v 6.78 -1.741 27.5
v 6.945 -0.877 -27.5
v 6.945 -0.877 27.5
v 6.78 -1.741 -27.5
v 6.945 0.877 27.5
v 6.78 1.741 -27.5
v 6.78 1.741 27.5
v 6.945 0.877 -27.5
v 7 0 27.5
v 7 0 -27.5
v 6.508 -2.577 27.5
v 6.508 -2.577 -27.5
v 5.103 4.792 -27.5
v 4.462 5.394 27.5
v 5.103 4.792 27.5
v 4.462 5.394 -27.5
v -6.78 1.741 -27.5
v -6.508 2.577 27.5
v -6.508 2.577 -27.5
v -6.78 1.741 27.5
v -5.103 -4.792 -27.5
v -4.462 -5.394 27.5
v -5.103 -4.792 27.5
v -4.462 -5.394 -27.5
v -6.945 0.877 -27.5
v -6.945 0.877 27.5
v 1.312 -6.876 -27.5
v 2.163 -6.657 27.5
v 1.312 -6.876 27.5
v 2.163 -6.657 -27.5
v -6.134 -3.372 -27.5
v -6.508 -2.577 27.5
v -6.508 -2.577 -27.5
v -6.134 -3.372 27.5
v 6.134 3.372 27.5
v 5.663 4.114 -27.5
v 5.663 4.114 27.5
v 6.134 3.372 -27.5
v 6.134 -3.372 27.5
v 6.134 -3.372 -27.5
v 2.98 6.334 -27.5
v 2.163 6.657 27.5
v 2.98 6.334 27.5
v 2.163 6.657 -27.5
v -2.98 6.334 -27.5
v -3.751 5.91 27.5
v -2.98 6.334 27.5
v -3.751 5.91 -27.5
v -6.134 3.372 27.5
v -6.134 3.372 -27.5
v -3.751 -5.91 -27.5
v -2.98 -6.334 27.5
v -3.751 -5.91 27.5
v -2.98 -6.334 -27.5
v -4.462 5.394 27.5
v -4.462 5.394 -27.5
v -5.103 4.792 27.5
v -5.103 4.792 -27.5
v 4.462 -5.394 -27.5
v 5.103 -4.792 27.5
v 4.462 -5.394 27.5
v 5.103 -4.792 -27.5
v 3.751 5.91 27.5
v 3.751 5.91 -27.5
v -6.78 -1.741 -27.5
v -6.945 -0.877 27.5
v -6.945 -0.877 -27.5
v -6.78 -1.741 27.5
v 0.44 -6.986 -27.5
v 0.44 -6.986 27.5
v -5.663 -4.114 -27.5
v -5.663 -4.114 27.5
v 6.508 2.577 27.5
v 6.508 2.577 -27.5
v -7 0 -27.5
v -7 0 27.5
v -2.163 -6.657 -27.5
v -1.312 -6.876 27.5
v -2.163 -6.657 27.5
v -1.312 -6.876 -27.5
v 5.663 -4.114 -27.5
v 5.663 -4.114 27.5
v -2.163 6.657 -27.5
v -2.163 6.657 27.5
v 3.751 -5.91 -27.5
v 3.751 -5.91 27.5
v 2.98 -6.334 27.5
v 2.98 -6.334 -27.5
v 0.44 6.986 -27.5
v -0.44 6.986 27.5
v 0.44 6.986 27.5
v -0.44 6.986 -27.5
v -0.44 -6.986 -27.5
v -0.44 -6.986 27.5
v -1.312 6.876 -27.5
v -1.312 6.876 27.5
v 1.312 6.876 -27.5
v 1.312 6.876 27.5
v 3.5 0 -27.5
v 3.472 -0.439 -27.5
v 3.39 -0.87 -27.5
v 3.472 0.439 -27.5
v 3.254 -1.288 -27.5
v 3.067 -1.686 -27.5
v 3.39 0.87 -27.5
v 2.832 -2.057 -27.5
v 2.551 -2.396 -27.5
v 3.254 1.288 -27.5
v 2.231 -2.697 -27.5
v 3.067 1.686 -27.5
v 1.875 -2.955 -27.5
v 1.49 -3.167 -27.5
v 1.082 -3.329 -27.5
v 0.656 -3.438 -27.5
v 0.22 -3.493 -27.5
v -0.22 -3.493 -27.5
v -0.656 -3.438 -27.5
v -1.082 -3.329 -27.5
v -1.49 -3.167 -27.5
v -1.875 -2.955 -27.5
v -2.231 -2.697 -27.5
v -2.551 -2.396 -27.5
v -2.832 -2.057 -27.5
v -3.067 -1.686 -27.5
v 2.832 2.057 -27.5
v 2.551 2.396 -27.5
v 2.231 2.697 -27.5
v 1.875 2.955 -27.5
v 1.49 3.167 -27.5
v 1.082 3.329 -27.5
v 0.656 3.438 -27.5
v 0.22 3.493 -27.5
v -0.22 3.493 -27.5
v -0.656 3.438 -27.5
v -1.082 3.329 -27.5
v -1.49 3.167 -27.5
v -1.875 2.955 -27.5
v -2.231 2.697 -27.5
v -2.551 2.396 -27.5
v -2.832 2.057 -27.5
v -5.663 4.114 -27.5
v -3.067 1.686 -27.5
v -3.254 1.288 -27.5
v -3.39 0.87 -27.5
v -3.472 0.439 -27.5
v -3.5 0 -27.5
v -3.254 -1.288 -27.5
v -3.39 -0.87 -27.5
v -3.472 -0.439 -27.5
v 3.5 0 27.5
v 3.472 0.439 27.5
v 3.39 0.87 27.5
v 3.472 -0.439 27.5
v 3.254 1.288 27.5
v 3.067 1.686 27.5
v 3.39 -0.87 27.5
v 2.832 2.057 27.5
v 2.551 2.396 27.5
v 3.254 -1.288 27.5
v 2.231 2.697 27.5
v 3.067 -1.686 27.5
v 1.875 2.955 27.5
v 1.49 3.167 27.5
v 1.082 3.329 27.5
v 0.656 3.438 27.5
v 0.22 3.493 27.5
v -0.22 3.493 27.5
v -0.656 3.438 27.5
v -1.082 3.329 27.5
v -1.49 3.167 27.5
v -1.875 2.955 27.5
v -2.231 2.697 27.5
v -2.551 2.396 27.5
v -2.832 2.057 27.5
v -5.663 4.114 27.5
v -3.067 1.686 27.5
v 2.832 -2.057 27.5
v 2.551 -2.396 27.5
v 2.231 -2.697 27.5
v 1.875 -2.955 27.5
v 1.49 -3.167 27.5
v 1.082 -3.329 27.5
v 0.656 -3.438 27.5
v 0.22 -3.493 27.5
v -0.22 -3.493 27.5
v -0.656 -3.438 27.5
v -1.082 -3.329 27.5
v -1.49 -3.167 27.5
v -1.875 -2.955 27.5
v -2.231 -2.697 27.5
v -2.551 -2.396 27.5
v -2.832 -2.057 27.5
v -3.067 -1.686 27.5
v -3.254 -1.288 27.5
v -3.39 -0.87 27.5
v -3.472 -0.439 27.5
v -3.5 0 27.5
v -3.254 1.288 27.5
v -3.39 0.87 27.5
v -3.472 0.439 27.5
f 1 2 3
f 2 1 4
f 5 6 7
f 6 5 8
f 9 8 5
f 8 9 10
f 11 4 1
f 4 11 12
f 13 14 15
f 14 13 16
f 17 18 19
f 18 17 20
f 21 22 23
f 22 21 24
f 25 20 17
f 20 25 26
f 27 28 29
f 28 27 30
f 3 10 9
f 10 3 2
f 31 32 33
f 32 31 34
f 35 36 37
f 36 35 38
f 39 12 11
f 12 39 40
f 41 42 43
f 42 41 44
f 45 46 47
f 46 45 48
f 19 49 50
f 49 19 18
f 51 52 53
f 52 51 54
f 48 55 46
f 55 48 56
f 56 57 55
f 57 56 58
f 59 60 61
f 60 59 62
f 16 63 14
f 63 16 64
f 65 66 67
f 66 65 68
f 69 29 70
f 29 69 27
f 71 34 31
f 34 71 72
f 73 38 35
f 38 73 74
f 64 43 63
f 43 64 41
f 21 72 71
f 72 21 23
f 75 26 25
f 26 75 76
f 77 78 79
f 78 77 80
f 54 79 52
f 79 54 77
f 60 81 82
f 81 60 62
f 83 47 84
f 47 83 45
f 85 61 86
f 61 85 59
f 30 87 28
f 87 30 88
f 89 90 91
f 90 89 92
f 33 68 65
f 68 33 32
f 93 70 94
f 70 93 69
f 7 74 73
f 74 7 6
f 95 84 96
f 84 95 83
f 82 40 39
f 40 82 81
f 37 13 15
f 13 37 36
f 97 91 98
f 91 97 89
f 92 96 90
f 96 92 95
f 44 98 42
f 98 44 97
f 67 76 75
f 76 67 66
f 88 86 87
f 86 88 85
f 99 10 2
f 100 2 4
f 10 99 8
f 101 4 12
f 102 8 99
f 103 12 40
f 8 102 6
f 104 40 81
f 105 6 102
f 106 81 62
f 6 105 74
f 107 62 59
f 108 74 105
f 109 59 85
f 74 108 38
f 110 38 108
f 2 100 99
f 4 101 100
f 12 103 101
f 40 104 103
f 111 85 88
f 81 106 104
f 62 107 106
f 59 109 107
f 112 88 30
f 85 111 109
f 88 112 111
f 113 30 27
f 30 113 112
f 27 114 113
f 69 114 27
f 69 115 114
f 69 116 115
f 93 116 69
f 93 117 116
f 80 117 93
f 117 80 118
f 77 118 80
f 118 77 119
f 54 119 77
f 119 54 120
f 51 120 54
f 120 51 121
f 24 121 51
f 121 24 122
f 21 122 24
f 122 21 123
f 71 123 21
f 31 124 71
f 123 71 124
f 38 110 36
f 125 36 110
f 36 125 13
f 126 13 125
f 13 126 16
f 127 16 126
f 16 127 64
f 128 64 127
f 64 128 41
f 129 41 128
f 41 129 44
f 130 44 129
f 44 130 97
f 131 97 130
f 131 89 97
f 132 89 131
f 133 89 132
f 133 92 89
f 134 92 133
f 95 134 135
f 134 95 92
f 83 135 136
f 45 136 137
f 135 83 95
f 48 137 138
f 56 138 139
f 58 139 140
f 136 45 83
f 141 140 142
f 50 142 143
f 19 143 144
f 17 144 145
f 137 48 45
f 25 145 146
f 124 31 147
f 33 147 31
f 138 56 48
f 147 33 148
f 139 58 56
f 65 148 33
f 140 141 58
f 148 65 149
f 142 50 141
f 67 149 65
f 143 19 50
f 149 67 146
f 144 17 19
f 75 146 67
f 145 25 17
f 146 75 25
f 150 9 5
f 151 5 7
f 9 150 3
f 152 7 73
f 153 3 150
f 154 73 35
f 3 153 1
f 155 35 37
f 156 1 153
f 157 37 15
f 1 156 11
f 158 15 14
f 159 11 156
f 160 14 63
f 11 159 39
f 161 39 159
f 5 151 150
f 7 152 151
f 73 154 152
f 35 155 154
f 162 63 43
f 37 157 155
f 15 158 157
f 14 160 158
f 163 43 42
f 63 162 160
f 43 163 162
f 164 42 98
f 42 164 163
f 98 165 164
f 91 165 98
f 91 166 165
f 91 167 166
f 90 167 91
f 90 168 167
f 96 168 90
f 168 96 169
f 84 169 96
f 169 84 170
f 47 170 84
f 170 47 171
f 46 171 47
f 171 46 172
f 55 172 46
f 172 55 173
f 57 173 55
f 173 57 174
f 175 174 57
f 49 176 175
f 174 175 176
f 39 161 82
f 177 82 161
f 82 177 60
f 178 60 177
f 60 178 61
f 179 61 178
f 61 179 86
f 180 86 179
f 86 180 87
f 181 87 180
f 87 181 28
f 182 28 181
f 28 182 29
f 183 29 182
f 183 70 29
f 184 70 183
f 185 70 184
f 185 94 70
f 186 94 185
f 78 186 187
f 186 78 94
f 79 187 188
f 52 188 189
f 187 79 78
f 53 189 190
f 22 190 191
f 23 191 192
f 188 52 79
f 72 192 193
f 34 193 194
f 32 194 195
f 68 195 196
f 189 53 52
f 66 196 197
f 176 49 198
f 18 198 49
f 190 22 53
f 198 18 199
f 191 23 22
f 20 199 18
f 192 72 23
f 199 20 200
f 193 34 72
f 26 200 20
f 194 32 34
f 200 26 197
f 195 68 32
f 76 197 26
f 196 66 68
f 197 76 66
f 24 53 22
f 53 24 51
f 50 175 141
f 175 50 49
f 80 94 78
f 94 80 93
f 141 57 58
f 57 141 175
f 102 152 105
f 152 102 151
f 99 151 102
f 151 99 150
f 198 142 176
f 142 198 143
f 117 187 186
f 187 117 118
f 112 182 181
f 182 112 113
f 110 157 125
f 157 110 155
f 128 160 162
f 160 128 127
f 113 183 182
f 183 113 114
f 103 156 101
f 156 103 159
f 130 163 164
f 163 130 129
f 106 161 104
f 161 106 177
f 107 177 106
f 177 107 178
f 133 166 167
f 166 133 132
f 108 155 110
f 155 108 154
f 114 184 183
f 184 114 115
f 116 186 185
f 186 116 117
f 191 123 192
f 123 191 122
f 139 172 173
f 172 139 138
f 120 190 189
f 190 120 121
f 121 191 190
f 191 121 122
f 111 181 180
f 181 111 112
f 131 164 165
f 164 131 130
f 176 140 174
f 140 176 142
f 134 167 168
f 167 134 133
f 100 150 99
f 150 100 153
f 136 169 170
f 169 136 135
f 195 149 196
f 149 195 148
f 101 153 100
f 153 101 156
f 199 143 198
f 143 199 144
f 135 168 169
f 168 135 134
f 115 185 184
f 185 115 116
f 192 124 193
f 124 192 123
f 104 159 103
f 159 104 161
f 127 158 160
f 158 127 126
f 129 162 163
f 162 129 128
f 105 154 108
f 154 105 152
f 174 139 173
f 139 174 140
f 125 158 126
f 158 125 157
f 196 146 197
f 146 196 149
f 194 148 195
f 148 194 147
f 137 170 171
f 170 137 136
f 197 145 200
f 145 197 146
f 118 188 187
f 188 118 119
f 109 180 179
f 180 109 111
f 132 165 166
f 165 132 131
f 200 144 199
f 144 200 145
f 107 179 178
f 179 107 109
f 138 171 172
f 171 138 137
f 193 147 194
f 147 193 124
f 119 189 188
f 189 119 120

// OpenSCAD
$fn = 50;


difference() {
	union() {
		translate(v = [0, 0, -27.5000000000]) {
			cylinder(h = 55, r = 7.0000000000);
		}
	}
	union() {
		translate(v = [0, 0, -100.0000000000]) {
			cylinder(h = 200, r = 3.5000000000);
		}
	}
}
